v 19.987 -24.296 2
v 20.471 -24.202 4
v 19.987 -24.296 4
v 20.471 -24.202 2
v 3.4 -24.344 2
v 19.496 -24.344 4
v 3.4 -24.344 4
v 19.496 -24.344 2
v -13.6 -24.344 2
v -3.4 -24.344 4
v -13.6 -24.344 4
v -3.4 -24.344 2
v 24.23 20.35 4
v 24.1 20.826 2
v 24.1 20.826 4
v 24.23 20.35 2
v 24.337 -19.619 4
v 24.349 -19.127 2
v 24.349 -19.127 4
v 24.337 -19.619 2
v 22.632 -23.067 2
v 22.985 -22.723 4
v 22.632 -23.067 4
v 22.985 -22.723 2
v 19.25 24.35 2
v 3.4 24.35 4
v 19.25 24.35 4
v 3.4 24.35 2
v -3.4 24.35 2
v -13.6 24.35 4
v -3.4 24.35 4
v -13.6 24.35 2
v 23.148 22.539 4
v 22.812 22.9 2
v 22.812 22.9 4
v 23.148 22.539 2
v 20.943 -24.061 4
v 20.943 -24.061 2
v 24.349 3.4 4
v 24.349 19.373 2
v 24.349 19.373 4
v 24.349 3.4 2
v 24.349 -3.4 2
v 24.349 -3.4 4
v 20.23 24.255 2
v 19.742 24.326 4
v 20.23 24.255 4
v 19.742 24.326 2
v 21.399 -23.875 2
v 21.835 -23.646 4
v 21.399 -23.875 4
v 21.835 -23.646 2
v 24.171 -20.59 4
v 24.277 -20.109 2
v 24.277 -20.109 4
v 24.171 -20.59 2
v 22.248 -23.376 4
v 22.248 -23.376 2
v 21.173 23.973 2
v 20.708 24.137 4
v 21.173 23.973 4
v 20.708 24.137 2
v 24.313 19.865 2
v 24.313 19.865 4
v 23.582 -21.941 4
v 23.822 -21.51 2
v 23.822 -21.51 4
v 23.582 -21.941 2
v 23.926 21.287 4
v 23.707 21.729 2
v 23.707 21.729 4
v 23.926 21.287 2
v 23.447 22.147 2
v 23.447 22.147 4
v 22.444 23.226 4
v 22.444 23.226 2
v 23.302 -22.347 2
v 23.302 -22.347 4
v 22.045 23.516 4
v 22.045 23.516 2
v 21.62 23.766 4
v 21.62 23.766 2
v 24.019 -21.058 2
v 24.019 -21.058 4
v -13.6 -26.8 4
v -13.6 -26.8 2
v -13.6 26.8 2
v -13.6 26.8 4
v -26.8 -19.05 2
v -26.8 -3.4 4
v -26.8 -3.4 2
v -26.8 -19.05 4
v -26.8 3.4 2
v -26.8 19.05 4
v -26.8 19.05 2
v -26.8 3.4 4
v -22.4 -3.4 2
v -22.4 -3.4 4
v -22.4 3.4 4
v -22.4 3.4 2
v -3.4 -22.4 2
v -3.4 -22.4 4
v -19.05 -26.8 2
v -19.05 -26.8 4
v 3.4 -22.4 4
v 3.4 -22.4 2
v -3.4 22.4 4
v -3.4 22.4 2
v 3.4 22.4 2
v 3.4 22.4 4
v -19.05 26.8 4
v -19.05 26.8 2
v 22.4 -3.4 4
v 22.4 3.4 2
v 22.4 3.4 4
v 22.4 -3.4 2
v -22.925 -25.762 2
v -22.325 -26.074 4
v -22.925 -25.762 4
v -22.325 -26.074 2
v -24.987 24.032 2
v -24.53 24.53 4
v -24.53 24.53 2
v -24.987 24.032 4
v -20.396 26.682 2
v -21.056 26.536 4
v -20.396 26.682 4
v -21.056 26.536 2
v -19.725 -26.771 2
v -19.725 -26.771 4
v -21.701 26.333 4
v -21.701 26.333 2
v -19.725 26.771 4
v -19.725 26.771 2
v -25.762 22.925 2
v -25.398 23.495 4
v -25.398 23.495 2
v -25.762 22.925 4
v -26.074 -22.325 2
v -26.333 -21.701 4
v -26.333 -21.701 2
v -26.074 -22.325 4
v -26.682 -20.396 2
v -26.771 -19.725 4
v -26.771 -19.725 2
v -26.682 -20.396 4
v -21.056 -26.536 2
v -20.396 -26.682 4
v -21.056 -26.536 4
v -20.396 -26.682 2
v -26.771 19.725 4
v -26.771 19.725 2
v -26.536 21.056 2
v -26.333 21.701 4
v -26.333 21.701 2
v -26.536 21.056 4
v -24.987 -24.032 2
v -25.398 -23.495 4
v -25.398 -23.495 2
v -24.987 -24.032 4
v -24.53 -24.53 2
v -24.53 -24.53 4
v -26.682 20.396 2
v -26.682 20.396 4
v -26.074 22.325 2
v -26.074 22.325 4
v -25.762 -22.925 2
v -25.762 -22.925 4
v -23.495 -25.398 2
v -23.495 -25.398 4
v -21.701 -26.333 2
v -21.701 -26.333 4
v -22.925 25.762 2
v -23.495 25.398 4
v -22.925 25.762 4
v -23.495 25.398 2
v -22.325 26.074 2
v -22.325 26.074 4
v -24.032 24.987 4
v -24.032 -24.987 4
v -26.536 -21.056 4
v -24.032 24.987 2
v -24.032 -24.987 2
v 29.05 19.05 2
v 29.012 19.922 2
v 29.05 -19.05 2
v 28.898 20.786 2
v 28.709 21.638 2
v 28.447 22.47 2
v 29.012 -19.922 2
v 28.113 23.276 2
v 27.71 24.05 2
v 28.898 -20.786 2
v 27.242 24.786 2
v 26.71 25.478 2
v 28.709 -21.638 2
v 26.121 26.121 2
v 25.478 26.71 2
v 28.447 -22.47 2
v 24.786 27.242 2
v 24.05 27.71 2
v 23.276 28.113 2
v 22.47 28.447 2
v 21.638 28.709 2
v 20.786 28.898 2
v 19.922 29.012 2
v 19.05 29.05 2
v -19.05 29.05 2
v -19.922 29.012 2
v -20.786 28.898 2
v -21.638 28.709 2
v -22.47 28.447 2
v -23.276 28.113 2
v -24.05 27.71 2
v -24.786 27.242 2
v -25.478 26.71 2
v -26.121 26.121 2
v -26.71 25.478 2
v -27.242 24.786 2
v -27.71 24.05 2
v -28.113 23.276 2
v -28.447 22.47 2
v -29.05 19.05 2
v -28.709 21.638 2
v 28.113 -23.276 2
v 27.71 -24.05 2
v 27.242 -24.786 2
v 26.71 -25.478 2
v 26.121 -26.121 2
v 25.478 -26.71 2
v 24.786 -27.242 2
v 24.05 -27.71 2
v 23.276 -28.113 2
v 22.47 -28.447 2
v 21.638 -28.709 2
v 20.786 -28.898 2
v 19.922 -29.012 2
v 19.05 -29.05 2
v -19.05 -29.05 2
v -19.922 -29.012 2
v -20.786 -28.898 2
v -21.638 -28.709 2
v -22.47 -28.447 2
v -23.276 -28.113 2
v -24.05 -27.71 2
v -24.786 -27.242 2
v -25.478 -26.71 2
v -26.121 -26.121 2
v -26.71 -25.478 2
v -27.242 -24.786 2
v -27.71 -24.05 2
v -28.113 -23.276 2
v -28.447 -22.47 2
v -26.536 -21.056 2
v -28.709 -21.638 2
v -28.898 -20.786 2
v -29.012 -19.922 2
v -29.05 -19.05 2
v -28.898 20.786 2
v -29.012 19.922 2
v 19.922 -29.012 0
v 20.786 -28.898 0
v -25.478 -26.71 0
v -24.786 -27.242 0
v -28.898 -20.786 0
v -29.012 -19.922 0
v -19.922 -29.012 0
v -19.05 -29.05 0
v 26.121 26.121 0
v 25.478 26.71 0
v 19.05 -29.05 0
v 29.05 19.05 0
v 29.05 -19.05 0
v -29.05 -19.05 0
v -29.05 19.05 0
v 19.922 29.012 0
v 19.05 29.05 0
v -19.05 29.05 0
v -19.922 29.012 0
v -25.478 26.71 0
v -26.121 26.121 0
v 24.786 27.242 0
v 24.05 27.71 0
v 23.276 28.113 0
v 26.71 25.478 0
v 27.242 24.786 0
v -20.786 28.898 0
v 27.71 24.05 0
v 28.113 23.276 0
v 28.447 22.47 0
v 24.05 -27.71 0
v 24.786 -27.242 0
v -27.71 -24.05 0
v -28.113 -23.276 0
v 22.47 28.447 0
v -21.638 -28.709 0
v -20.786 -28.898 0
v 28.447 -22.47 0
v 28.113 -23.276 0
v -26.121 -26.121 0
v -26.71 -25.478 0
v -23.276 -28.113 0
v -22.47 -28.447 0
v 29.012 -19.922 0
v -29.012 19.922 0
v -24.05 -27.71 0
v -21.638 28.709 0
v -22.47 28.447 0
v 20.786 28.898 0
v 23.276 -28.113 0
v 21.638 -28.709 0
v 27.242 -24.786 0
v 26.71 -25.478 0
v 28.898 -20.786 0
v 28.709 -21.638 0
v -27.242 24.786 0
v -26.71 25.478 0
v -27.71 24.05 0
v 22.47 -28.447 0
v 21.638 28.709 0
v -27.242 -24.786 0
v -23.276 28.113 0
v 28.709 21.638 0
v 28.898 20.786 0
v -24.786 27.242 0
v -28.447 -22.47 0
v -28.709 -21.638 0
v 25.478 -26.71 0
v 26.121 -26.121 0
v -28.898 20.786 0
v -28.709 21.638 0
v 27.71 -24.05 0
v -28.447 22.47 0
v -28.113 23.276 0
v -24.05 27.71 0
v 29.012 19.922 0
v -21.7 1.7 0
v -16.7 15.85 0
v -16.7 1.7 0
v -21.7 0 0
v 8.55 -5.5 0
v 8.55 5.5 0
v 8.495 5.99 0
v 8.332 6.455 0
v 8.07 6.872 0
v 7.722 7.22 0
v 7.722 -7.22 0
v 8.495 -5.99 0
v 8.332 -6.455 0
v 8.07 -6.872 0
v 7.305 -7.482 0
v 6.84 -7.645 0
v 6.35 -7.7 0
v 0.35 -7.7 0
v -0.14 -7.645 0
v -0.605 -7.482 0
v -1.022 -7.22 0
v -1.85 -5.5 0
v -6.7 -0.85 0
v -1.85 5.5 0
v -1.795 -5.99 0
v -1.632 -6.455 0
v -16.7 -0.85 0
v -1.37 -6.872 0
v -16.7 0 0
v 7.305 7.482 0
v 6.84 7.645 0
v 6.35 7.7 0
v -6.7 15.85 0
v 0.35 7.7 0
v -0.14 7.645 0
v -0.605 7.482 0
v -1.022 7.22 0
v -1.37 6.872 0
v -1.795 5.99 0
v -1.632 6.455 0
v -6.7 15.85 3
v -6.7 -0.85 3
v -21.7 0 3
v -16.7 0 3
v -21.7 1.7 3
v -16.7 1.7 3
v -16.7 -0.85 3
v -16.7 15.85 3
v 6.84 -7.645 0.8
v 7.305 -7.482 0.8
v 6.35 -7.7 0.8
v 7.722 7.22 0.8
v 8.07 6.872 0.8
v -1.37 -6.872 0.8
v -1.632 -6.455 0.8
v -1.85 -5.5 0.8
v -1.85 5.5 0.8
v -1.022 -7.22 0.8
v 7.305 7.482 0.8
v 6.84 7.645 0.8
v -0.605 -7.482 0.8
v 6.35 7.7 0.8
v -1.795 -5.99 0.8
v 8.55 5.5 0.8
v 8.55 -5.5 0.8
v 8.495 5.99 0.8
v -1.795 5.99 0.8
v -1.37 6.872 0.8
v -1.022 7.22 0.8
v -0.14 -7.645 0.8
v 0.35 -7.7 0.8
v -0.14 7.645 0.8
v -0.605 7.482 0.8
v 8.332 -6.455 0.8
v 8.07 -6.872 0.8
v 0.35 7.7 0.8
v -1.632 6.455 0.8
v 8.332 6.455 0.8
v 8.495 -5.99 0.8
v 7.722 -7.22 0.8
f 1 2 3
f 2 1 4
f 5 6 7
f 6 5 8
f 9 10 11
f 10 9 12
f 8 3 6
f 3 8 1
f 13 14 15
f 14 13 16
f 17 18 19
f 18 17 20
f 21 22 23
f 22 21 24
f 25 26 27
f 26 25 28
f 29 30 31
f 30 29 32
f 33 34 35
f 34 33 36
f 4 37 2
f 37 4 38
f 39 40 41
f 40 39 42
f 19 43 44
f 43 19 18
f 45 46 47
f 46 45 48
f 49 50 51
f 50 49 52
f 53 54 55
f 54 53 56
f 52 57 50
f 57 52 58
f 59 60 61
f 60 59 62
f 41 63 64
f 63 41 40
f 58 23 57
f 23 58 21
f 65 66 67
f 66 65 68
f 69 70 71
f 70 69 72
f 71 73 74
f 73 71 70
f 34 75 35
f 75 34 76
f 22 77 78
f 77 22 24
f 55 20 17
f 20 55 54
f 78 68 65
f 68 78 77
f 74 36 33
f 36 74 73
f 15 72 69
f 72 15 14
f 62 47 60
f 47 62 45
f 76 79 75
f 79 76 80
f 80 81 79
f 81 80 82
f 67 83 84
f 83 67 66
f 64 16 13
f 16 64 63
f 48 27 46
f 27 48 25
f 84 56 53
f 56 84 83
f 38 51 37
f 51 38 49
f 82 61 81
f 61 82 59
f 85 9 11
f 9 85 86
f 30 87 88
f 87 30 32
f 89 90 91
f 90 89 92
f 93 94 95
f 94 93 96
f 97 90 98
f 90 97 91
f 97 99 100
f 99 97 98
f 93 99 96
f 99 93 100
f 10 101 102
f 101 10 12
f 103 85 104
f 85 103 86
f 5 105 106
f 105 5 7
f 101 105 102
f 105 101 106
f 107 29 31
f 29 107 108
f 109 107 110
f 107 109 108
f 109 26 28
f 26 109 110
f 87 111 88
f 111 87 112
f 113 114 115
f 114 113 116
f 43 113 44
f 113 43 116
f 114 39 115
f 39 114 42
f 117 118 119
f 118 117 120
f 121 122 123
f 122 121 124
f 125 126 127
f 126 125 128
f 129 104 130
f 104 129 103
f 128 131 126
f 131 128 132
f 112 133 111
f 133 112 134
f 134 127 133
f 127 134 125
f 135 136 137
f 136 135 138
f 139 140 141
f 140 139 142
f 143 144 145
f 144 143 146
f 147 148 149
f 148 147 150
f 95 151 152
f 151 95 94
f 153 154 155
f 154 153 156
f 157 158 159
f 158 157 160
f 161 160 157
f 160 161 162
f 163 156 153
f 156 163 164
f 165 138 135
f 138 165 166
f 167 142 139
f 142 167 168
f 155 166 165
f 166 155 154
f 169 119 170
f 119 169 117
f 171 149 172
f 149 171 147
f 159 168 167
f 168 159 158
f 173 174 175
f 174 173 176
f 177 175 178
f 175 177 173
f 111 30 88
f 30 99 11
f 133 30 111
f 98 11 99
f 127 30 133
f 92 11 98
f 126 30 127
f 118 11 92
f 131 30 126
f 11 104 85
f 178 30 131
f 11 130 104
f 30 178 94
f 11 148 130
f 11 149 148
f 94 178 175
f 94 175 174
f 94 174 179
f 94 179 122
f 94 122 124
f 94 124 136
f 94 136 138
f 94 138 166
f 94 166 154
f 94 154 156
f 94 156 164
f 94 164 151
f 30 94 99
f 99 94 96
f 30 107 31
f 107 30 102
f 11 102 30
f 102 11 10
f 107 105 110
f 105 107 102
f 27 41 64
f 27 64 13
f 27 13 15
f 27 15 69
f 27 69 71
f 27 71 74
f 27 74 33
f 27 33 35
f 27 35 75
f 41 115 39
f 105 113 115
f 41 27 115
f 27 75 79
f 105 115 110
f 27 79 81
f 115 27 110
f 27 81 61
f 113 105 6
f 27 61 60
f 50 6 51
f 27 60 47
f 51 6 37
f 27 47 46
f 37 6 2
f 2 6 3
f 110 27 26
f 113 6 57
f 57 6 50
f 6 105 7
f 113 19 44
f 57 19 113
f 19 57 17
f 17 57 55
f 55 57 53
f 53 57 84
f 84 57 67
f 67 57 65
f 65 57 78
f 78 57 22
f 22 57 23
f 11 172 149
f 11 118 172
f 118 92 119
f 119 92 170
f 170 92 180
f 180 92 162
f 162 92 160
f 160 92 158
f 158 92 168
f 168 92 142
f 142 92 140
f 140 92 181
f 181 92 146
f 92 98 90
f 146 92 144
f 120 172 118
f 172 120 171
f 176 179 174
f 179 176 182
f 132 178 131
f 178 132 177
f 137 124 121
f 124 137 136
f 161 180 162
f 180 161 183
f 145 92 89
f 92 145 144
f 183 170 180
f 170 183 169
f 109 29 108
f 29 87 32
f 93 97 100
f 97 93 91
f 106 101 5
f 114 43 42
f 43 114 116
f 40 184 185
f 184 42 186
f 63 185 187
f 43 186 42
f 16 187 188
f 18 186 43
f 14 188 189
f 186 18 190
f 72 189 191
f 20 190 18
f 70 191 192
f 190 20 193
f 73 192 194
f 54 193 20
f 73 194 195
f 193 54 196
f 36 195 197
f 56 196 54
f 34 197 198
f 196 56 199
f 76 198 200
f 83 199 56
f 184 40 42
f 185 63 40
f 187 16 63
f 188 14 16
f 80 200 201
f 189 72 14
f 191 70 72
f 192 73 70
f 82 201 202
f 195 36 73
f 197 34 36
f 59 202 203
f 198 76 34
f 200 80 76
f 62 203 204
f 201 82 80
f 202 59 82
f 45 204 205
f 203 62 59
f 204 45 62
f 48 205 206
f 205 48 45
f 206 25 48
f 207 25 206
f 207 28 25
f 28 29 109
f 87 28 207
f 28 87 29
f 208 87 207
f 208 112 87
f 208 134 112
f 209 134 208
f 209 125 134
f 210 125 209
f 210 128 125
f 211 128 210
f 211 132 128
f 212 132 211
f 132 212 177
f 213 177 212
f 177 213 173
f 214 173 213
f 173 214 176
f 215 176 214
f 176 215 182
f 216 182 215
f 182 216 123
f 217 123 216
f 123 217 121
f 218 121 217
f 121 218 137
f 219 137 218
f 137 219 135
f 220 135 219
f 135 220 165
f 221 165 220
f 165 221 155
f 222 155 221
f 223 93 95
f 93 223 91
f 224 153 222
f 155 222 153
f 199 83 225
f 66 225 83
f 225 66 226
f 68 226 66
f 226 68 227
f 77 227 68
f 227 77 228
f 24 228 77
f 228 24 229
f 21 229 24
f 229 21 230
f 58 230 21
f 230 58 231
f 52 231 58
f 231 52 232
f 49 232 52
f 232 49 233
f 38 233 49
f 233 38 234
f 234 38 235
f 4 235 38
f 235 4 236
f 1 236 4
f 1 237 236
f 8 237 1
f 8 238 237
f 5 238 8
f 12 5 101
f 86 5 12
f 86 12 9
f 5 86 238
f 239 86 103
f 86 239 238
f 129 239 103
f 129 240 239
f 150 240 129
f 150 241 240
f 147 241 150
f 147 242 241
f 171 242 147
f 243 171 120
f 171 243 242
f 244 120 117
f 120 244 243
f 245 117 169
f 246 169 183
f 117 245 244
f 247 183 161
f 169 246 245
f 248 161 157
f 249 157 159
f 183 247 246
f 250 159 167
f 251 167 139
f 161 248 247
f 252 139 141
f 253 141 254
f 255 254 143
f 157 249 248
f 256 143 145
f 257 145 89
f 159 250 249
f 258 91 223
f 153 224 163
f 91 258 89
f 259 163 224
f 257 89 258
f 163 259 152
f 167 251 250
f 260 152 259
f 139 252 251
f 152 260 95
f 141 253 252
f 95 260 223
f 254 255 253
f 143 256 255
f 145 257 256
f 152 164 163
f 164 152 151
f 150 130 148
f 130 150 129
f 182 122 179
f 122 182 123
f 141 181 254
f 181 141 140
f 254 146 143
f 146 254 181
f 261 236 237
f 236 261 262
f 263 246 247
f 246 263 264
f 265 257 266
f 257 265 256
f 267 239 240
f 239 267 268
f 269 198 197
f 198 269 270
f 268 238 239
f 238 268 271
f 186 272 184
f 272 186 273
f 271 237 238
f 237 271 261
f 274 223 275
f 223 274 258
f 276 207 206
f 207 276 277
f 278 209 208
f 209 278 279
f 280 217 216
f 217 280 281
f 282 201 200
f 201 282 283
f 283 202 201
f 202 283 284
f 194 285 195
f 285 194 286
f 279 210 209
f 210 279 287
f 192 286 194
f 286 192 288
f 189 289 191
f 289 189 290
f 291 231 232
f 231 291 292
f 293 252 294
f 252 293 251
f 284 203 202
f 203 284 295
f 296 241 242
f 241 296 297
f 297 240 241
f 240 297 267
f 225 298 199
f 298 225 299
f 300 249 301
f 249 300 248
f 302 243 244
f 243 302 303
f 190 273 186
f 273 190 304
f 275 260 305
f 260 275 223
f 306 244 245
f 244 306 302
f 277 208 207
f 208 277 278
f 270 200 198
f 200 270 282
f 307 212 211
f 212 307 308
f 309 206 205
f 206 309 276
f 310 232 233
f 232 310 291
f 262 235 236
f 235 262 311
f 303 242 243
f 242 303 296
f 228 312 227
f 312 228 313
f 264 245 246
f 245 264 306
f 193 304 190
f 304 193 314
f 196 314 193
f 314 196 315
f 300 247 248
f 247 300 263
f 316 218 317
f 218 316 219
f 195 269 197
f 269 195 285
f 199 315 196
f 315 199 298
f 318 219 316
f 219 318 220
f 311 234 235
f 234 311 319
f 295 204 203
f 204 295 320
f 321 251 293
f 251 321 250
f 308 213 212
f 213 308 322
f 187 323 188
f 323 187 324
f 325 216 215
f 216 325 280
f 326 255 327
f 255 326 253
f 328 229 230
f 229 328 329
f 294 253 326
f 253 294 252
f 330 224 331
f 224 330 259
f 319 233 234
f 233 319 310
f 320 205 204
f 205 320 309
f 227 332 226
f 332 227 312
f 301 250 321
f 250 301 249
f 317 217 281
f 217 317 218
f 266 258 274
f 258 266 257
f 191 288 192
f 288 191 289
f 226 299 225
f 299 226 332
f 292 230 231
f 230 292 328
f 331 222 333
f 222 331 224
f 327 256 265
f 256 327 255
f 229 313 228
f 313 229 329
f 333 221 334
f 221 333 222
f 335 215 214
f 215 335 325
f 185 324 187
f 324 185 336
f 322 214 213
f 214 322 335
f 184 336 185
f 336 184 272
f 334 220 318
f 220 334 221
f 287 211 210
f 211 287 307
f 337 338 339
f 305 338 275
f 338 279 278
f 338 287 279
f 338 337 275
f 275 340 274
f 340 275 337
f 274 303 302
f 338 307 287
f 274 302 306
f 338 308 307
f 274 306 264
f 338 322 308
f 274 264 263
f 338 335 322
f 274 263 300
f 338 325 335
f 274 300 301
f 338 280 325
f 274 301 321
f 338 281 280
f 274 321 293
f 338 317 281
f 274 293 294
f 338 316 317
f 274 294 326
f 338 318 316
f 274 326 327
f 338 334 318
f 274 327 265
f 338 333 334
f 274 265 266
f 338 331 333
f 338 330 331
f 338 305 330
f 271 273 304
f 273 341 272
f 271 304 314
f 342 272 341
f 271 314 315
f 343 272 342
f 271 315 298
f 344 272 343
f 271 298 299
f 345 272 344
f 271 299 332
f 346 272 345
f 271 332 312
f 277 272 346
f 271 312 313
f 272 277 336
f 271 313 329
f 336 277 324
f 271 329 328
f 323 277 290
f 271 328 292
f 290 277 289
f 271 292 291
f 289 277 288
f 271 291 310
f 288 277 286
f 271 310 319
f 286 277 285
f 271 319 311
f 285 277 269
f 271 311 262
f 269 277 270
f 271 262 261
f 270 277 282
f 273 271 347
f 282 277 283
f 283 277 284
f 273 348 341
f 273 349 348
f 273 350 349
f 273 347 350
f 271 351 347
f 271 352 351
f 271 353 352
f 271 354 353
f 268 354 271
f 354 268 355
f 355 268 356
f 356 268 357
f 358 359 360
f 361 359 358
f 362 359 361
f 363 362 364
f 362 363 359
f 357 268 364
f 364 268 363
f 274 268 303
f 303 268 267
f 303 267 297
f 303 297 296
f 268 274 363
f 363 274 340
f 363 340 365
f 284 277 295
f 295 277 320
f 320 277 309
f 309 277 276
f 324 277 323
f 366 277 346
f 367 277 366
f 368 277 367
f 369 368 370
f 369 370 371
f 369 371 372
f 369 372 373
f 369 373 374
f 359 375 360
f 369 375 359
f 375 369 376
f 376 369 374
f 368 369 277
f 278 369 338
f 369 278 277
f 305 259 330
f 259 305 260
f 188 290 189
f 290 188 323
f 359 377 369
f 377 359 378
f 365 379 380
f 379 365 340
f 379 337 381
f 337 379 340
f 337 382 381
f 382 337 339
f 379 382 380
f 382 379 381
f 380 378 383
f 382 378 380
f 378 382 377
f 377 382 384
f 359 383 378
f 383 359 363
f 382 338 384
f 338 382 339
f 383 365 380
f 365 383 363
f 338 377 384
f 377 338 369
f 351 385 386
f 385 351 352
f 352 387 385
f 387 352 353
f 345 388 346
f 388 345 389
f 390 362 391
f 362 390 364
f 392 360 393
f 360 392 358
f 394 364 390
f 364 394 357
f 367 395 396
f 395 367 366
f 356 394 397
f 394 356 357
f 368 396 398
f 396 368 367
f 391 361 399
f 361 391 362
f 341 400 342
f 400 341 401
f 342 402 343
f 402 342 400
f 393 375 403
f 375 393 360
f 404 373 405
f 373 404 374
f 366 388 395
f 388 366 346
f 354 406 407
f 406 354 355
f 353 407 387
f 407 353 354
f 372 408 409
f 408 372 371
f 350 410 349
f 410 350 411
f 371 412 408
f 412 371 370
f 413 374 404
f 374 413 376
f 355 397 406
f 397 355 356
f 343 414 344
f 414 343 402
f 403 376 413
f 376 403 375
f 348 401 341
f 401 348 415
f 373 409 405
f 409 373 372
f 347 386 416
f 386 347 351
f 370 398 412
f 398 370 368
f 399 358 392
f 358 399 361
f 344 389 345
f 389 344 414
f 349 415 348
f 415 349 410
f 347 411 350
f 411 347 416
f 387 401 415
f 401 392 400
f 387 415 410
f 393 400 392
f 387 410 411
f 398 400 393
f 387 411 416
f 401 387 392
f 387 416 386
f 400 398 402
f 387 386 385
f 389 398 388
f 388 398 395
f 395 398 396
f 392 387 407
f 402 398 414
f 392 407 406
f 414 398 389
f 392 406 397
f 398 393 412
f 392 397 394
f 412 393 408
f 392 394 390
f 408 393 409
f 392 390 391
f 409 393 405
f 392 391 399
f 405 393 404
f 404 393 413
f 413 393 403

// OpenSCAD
// file: handle.scad
module handle(length, thickness, depth, center=true) {
	linear_extrude(thickness)
		square([length, thickness], center);

	translate([center ? -length/2 : 0, 0])
	linear_extrude(depth) {
		square(thickness, center);
		translate([length - (center ? 0 : thickness), 0])
			square(thickness, center);
	}
}

handle(15, 4, 10);
// file: drawer.scad
include <config.scad>;
use <box.scad>;

module drawer(od, depth, height, drawer_thickness, bevel, pegs=true) {
	id = od - 2 * drawer_thickness;

	difference () {
		union () {				
			difference () {
				linear_extrude(depth)
					rounded_rect(od, od, bevel);

				translate([0, 0, surface_thickness])
				linear_extrude(depth)
					rounded_rect(id, id, bevel - drawer_thickness);
			}

			if (pegs)
				linear_extrude(depth)
				pegs(2 * peg_height + tolerance, 3 * peg_width + 2 * tolerance, od);
		}

		if (pegs)
			translate([0, 0, -1])
			linear_extrude(depth+2)
			pegs(peg_height + 2 * tolerance, peg_width + 2 * tolerance, od + 2 * tolerance);

		translate([0, height, depth/2])
			cube([od+2, od, depth + 2], true);
	}
}

%translate(-[tooth_height/2, tooth_height/2, surface_thickness])
	box(box_size - tooth_height, box_height, box_thickness, teeth);

drawer(drawer_od, drawer_depth, drawer_height, drawer_thickness, box_inner_bevel - tolerance, pegs=false);
// file: box.scad
include <config.scad>;

module tooth(h, b, a, t) {
	// h = height
	// b = longer edge
	// a = shorter edge
	// t = tolerance (added equally all around)

	x1 = 1/2 * a + t;
	y1 = h;
	x2 = 1/2 * b + t;
	y2 = 0;

	m = (y2 - y1)/(x2 - x1);
	b = y1 - m * x1;

	function x(y) = (y-b)/m;

	polygon([
		[-x(-t), -t],
		[x(-t), -t],
		[x(h+t), h+t],
		[-x(h+t), h+t]
	]);
}


module pegs(peg_height, peg_width, id, quarter=true) {
	for (x = [-1, 1], r = [0, 90])
		if (r == 0 || quarter)
			rotate([0, 0, r])
			translate([x * (id - peg_height)/2 , 0])
			square([peg_height, peg_width], true);
}

module rounded_rect(w, h, bevel)
{
	hull()
	{
		// place 4 circles in the corners, with the given radius
		for (x = [-1, 1], y = [-1, 1])
			translate([x * (w/2 - bevel), y * (h/2 - bevel)])
			circle(r=bevel);
	}
}


module box(od, depth, thickness, teeth, box_color, drawer_color) {
	step = od/(teeth+1);
	bevel = box_bevel;	
	id = od - thickness * 2 - tooth_height;

	linear_extrude(depth, false)
	{
		difference() {
			union() {
				// Body
				difference() {
					union() {
						translate([tooth_height, tooth_height]/2)
							rounded_rect(od - tooth_height, od - tooth_height, bevel);
						rounded_rect(od, od, bevel);
					}
					translate([tooth_height, tooth_height]/2)
						rounded_rect(id, id, bevel - thickness);
				}

				// Teeth
				for (i = [-od/2 + step : step : od/2 - step], j = [0,-90])
					rotate([0, 0, j])
					translate([i, od/2, 0])
					tooth(tooth_height, tooth_bottom, tooth_top, 0);
			}

			// Sockets
			for (i = [-od/2 + step : step : od/2 - step], j = [0,-90])
				rotate([0, 0, j])
				translate([i, -od/2, 0])
				tooth(tooth_height, tooth_bottom, tooth_top, tolerance);
		}
	}
				
	// Pegs in the center of each side to support drawers
	linear_extrude(depth - peg_offset, false)
		translate([tooth_height, tooth_height]/2)
		pegs(peg_height, peg_width, id);


	linear_extrude(surface_thickness)
	{
		translate([tooth_height, tooth_height]/2)
		rounded_rect(id, id, bevel - thickness);
	}
}

%translate([-box_size/2, 0])
	box(box_size - tooth_height, box_height, box_thickness, teeth);

%translate([0, box_size])
	box(box_size - tooth_height, box_height, box_thickness, teeth);

translate([box_size/2, 0])
	!box(box_size - tooth_height, box_height, box_thickness, teeth);
// file: config.scad
$fs=0.5;
$fa=5;

//************************//
// Defaults for all parts //
//************************//
tolerance = 0.2;
wall_thickness = 2.25;
surface_thickness = 2;


//****************//
// Box Properties //
//****************//

/* Includes the height of the interlocking teeth, so the inner
 * diameter of the box will be box_size - 2 * box_thickness - 2 * tooth_height
 */
box_size = 61.5;
box_bevel = 10;
box_thickness = wall_thickness;
box_height = 75;

//*******************//
// Tooth  Properties //
//*******************//
teeth = 3;
tooth_height = 1.5;
tooth_top = 7.5;
tooth_bottom = 5;

//*******************//
// Drawer Properties //
//*******************//
peg_height = surface_thickness;
peg_width= surface_thickness;
peg_offset = surface_thickness;
drawer_thickness = wall_thickness;

//*********************//
// Computed Properties //
//*********************//
box_inner = box_size - 2 * box_thickness - 2 * tooth_height;
box_inner_bevel = box_bevel - wall_thickness;
drawer_od = box_inner - 2 * tolerance;
drawer_id = drawer_od - 2 * drawer_thickness;
drawer_depth = box_height - surface_thickness - tolerance;
drawer_height = drawer_od * 3/4;
// main file
include <config.scad>;

use <box.scad>;
use <drawer.scad>;
use <handle.scad>;

od = drawer_od;
id = drawer_id;

rotate([0, 0, 90]) {
	difference() {
		union () {
			linear_extrude(surface_thickness)
				rounded_rect(od + 2 * box_thickness, od + 2 * box_thickness, box_bevel);

			difference() {
				translate([0, 0, surface_thickness])
				linear_extrude(surface_thickness)
					rounded_rect(od, od, box_inner_bevel);

				translate([0, 0, -30]) {		
					drawer(box_inner, drawer_depth, drawer_height + 2 * tolerance, drawer_thickness + 2 * tolerance, box_inner_bevel);
					linear_extrude(drawer_depth)
						pegs(2 * peg_height + 2 * tolerance, 3 * peg_width + 4 * tolerance, drawer_od);
				}
			}
		}

		translate([0, -od/16, 0])
			linear_extrude(1.6, center=true)
			rounded_rect(15 + 2 * tolerance, 10 + 2 * tolerance, 2 + tolerance);

		translate([0, od/8, 3])
			rotate([-90,0,0])
			handle(1.5 + tolerance, 15, 10, 5);
	}

	*translate(-[tooth_height/2, tooth_height/2, box_height])
		box(box_size - tooth_height, box_height, box_thickness, teeth);

	*%rotate([180, 0, 0]) 
		translate([0, 0, -drawer_depth-2])
		drawer(drawer_od, drawer_depth, drawer_height, drawer_thickness, box_inner_bevel - tolerance);
}
